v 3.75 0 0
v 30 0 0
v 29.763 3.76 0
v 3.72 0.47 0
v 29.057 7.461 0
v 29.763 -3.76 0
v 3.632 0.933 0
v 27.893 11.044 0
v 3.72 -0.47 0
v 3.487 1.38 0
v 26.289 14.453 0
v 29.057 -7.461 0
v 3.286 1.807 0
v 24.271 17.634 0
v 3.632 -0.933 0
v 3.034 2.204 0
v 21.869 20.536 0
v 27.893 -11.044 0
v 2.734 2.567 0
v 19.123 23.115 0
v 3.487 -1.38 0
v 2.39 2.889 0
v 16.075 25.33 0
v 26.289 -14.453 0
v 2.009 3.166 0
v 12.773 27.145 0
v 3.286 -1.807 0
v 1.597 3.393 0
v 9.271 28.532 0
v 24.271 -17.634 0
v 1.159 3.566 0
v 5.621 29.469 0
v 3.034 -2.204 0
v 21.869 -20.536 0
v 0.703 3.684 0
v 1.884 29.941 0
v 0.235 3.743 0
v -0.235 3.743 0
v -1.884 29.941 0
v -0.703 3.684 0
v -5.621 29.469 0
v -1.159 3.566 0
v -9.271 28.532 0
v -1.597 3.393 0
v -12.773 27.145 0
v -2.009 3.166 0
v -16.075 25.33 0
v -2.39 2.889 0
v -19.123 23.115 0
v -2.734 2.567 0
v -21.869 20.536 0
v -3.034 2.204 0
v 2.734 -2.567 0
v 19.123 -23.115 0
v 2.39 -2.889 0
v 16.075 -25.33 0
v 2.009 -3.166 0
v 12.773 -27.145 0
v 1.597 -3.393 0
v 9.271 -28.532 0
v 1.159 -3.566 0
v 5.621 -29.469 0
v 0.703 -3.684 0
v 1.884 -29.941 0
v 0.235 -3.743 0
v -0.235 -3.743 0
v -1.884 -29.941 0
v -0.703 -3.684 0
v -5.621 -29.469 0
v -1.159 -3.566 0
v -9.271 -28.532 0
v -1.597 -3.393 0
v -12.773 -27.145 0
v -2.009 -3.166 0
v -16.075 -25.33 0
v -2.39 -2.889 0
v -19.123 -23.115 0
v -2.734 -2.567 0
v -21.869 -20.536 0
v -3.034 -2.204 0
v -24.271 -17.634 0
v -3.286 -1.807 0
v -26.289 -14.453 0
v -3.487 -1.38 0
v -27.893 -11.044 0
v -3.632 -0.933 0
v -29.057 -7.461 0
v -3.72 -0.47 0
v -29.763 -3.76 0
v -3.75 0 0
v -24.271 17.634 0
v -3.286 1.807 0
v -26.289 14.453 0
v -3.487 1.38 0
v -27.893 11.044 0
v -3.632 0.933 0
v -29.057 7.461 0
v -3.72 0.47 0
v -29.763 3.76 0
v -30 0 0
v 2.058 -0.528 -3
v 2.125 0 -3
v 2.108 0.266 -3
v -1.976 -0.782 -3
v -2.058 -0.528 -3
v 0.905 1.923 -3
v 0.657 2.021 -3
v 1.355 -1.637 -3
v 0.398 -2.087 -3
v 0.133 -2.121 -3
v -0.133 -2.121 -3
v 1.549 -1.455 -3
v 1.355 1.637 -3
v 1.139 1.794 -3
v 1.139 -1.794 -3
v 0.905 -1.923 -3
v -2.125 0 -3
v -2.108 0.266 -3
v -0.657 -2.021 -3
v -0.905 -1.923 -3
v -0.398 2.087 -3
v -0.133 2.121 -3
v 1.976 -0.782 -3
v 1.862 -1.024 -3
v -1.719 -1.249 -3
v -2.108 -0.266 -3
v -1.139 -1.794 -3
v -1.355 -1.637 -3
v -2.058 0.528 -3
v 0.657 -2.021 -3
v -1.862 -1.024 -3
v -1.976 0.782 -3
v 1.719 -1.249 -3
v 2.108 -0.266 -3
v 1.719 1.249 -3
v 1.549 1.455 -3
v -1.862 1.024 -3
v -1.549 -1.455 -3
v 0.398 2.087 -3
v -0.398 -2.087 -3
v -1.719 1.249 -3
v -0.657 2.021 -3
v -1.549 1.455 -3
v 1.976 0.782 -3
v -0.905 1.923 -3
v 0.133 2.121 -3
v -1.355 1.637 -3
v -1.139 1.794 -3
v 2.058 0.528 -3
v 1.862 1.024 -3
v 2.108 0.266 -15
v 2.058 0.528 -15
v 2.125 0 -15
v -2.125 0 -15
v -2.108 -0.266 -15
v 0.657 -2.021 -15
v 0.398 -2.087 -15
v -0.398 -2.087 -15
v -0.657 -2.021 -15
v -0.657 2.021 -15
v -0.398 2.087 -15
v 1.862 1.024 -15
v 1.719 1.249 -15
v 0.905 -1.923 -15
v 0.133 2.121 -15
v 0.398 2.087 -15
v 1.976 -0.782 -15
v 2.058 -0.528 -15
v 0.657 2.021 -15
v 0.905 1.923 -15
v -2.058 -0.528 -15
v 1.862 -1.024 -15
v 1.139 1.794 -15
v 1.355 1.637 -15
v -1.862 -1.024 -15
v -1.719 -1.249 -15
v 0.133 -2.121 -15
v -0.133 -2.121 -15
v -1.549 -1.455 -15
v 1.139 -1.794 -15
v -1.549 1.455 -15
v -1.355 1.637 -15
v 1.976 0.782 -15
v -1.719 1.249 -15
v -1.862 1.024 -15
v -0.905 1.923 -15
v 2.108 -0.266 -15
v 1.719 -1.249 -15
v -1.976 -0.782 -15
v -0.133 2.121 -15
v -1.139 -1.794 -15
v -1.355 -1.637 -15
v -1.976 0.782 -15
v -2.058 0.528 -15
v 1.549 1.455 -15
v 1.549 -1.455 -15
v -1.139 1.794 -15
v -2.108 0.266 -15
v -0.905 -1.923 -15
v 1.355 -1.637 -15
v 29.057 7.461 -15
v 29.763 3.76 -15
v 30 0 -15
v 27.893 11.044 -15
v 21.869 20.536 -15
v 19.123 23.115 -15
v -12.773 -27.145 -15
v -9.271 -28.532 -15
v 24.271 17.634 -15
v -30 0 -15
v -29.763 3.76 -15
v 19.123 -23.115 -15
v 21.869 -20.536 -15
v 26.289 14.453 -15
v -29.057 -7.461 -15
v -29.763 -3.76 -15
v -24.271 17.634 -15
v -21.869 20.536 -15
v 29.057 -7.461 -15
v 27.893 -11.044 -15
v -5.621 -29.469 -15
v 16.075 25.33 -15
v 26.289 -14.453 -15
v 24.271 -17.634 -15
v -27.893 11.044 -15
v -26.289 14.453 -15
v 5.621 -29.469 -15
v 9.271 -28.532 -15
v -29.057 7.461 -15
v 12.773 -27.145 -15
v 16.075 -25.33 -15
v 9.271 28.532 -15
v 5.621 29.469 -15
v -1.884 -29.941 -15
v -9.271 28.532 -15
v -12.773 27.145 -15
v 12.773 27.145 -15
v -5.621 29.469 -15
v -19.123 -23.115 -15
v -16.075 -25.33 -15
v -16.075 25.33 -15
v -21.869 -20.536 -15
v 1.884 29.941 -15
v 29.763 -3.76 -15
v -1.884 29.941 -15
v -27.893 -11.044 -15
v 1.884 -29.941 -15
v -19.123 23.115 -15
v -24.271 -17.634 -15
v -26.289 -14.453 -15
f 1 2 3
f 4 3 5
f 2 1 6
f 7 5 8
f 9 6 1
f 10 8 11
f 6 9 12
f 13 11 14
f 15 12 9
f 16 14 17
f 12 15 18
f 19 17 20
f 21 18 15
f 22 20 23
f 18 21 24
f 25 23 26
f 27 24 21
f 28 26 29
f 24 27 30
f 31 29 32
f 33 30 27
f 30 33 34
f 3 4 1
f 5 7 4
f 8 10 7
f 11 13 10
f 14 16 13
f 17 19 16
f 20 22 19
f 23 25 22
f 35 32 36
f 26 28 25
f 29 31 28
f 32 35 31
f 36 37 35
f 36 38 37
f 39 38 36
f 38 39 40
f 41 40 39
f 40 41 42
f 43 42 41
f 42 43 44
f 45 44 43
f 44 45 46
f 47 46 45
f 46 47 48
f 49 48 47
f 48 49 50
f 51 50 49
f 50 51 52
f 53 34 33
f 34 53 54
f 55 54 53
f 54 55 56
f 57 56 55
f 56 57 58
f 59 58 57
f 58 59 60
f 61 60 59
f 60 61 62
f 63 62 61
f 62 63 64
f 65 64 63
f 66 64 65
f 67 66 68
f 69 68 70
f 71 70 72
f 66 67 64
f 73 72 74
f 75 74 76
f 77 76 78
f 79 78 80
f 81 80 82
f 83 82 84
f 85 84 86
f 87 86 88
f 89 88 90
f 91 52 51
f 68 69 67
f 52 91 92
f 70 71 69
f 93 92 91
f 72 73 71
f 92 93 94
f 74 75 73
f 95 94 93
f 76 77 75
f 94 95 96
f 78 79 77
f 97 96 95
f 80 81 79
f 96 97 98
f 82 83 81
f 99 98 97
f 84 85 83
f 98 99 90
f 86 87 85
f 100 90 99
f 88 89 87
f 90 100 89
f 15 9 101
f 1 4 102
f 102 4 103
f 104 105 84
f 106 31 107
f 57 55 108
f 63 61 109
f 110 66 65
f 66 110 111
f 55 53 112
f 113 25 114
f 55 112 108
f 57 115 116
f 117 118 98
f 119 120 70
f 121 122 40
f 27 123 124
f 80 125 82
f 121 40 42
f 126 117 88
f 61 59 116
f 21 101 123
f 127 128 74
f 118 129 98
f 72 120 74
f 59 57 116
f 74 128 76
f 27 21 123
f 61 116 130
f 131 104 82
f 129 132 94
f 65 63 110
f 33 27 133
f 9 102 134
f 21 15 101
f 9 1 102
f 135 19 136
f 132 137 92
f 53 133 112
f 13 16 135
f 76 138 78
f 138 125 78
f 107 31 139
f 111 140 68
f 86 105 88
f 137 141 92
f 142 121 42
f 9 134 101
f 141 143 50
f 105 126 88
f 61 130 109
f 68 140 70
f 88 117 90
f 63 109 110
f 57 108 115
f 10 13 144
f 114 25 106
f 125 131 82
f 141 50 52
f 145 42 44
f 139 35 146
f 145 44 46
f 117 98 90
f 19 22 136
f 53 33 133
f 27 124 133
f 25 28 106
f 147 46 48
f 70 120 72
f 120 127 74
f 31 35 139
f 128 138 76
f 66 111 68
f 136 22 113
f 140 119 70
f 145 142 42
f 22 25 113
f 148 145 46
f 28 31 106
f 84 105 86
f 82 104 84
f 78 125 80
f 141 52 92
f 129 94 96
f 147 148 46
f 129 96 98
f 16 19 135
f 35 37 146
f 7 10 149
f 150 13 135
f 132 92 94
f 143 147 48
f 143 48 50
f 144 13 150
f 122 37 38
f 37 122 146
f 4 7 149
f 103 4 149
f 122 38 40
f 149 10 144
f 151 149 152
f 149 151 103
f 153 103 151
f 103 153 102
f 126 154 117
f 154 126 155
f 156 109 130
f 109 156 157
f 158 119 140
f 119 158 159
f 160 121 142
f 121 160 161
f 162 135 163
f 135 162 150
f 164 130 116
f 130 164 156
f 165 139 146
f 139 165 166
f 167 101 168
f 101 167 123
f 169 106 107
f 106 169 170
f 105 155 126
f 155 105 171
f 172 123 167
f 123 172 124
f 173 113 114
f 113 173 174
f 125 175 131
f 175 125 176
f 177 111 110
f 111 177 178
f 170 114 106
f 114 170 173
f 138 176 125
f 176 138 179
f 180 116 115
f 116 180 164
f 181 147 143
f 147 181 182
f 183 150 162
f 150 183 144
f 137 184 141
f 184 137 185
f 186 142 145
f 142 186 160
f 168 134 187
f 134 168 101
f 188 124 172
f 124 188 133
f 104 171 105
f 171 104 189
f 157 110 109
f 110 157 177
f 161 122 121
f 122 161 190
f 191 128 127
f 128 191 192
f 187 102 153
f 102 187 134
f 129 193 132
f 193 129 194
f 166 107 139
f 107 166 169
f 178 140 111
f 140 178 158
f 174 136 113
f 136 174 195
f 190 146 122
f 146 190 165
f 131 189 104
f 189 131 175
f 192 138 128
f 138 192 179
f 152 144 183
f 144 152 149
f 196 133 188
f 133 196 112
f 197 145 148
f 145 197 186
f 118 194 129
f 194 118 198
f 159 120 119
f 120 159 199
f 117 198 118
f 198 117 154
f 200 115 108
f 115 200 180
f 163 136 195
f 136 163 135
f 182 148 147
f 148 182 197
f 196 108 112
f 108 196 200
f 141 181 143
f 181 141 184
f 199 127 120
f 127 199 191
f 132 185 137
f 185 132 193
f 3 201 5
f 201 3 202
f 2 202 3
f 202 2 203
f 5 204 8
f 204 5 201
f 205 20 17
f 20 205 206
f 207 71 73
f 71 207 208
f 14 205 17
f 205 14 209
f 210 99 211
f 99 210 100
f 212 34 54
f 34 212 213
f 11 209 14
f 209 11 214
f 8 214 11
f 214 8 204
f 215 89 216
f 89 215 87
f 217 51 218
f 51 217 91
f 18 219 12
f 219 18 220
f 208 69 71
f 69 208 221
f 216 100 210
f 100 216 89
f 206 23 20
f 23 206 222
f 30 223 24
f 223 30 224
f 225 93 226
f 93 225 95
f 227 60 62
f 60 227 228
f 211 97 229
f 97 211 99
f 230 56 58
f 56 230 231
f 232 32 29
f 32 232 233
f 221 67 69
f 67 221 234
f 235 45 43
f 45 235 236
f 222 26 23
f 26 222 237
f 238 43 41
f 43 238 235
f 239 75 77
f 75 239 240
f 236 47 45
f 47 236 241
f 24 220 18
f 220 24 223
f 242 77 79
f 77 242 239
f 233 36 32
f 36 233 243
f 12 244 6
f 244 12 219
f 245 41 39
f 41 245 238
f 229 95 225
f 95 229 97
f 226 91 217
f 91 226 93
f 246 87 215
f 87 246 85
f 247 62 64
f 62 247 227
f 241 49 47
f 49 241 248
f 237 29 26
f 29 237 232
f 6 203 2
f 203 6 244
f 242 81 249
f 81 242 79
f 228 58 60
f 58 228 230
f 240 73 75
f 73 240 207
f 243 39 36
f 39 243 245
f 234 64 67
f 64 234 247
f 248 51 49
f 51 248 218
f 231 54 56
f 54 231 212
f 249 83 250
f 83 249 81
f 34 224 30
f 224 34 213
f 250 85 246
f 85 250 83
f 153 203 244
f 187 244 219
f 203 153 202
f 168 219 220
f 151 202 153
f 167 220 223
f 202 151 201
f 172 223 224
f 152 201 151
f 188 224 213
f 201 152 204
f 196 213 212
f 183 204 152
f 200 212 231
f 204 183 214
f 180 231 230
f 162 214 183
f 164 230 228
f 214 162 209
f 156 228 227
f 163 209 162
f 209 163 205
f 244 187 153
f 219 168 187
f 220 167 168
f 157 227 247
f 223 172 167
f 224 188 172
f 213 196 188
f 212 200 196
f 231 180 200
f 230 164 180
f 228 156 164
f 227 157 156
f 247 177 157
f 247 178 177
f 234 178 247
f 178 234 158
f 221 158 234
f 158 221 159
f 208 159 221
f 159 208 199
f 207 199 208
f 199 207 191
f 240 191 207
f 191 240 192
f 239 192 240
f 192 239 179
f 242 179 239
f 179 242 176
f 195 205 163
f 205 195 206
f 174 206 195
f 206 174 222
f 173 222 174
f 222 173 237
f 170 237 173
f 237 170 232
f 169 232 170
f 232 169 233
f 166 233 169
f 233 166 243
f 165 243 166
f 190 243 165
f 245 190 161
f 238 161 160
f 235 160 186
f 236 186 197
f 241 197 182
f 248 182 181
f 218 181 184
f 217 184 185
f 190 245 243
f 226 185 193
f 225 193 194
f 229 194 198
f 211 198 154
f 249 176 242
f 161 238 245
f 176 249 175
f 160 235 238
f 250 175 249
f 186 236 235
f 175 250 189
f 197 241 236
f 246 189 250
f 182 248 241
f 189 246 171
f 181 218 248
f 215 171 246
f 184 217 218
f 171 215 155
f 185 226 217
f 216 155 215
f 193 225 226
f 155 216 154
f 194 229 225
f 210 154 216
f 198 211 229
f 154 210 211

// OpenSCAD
$fn = 50;

difference() {
	union() {
		translate(v = [0, 0, -15.0]) {
			cylinder(h = 15, r = 30.0);
		}
	}
	union() {
		translate(v = [0, 0, 0]) {
			rotate(a = [0, 0, 0]) {
				difference() {
					union() {
						translate(v = [0, 0, -18.0]) {
							cylinder(h = 18, r = 2.0);
						}
						translate(v = [0, 0, -3]) {
							cylinder(h = 3, r1 = 2.125, r2 = 3.75);
						}
						translate(v = [0, 0, -18.0]) {
							cylinder(h = 18, r = 2.125);
						}
						translate(v = [0, 0, -18.0]) {
							cylinder(h = 18, r = 2.0);
						}
					}
					union();
				}
			}
		}
	}
}
